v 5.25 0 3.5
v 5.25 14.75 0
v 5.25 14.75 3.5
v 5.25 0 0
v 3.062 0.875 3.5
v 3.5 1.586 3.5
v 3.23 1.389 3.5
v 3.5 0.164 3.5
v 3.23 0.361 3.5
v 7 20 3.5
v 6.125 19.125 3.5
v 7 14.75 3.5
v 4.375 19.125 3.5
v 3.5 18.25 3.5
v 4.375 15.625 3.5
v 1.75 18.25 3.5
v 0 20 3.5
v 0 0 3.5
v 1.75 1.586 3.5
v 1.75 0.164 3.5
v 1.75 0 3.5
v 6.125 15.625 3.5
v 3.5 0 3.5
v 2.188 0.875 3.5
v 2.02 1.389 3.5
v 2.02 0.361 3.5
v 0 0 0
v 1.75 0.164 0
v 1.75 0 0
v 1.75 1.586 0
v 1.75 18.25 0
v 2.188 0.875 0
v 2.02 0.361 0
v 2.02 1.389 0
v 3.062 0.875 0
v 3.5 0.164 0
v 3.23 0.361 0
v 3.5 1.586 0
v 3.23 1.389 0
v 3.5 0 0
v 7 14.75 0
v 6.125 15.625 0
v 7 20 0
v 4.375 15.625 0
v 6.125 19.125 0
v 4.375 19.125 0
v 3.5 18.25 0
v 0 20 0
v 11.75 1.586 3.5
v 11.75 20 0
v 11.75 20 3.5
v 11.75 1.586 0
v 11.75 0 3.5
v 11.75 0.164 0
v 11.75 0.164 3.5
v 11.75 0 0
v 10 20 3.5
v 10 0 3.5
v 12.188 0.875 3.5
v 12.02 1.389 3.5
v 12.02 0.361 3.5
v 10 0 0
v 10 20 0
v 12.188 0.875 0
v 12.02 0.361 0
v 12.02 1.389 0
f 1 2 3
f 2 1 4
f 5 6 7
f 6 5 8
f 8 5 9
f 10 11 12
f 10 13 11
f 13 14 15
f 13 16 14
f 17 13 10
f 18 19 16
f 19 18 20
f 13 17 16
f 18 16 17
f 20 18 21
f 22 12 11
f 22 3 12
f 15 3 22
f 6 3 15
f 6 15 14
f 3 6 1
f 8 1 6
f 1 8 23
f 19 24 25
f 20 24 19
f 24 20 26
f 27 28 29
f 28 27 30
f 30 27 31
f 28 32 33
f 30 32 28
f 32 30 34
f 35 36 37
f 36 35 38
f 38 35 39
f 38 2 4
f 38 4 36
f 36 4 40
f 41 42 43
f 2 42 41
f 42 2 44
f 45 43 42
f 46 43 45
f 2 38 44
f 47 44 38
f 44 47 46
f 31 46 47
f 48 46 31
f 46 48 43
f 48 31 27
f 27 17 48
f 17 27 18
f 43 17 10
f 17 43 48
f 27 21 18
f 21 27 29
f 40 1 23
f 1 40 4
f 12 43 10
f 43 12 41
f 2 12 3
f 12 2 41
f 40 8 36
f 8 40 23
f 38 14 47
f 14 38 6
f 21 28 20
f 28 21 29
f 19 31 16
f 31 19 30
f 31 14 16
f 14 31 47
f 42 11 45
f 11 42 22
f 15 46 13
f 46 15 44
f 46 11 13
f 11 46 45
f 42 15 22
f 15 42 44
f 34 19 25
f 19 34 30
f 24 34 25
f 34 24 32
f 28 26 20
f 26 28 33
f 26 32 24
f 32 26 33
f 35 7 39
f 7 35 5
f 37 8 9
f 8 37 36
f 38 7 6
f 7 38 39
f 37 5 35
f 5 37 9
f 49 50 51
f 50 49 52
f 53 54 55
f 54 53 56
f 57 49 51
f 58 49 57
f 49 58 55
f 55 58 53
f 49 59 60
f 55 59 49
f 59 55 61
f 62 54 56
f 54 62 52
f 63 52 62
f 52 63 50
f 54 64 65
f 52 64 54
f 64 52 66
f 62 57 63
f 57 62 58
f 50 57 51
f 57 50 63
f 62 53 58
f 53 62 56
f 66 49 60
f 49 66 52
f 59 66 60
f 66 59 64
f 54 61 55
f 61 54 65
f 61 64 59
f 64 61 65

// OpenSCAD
echo(version=version());
$fn=10;

// Values are in millimeters
thickness = 1.75;
length=20;

union() {
	difference() {
		union() {
			cube([thickness*3,length,thickness*2]);
			translate([thickness*3,length-thickness*3,0])
				cube([thickness,thickness*3,thickness*2]);
		}
		translate([thickness,-thickness,-0.5])
			cube([thickness,length,thickness*2+1]);
		translate([thickness*3-thickness/2,length-thickness*3+thickness/2,-0.5])
			cube([thickness,thickness*2,thickness*4]);
	}
	translate([thickness*3/4,thickness/2,0])
		cylinder(d=thickness,h=thickness*2);
	translate([thickness*2+thickness*1/4,thickness/2,0])
		cylinder(d=thickness,h=thickness*2);
}

translate([10,0,0])
union() {
	cube([thickness,length,thickness*2]);
	translate([thickness*3/4,thickness/2,0])
		cylinder(d=thickness,h=thickness*2);
}
